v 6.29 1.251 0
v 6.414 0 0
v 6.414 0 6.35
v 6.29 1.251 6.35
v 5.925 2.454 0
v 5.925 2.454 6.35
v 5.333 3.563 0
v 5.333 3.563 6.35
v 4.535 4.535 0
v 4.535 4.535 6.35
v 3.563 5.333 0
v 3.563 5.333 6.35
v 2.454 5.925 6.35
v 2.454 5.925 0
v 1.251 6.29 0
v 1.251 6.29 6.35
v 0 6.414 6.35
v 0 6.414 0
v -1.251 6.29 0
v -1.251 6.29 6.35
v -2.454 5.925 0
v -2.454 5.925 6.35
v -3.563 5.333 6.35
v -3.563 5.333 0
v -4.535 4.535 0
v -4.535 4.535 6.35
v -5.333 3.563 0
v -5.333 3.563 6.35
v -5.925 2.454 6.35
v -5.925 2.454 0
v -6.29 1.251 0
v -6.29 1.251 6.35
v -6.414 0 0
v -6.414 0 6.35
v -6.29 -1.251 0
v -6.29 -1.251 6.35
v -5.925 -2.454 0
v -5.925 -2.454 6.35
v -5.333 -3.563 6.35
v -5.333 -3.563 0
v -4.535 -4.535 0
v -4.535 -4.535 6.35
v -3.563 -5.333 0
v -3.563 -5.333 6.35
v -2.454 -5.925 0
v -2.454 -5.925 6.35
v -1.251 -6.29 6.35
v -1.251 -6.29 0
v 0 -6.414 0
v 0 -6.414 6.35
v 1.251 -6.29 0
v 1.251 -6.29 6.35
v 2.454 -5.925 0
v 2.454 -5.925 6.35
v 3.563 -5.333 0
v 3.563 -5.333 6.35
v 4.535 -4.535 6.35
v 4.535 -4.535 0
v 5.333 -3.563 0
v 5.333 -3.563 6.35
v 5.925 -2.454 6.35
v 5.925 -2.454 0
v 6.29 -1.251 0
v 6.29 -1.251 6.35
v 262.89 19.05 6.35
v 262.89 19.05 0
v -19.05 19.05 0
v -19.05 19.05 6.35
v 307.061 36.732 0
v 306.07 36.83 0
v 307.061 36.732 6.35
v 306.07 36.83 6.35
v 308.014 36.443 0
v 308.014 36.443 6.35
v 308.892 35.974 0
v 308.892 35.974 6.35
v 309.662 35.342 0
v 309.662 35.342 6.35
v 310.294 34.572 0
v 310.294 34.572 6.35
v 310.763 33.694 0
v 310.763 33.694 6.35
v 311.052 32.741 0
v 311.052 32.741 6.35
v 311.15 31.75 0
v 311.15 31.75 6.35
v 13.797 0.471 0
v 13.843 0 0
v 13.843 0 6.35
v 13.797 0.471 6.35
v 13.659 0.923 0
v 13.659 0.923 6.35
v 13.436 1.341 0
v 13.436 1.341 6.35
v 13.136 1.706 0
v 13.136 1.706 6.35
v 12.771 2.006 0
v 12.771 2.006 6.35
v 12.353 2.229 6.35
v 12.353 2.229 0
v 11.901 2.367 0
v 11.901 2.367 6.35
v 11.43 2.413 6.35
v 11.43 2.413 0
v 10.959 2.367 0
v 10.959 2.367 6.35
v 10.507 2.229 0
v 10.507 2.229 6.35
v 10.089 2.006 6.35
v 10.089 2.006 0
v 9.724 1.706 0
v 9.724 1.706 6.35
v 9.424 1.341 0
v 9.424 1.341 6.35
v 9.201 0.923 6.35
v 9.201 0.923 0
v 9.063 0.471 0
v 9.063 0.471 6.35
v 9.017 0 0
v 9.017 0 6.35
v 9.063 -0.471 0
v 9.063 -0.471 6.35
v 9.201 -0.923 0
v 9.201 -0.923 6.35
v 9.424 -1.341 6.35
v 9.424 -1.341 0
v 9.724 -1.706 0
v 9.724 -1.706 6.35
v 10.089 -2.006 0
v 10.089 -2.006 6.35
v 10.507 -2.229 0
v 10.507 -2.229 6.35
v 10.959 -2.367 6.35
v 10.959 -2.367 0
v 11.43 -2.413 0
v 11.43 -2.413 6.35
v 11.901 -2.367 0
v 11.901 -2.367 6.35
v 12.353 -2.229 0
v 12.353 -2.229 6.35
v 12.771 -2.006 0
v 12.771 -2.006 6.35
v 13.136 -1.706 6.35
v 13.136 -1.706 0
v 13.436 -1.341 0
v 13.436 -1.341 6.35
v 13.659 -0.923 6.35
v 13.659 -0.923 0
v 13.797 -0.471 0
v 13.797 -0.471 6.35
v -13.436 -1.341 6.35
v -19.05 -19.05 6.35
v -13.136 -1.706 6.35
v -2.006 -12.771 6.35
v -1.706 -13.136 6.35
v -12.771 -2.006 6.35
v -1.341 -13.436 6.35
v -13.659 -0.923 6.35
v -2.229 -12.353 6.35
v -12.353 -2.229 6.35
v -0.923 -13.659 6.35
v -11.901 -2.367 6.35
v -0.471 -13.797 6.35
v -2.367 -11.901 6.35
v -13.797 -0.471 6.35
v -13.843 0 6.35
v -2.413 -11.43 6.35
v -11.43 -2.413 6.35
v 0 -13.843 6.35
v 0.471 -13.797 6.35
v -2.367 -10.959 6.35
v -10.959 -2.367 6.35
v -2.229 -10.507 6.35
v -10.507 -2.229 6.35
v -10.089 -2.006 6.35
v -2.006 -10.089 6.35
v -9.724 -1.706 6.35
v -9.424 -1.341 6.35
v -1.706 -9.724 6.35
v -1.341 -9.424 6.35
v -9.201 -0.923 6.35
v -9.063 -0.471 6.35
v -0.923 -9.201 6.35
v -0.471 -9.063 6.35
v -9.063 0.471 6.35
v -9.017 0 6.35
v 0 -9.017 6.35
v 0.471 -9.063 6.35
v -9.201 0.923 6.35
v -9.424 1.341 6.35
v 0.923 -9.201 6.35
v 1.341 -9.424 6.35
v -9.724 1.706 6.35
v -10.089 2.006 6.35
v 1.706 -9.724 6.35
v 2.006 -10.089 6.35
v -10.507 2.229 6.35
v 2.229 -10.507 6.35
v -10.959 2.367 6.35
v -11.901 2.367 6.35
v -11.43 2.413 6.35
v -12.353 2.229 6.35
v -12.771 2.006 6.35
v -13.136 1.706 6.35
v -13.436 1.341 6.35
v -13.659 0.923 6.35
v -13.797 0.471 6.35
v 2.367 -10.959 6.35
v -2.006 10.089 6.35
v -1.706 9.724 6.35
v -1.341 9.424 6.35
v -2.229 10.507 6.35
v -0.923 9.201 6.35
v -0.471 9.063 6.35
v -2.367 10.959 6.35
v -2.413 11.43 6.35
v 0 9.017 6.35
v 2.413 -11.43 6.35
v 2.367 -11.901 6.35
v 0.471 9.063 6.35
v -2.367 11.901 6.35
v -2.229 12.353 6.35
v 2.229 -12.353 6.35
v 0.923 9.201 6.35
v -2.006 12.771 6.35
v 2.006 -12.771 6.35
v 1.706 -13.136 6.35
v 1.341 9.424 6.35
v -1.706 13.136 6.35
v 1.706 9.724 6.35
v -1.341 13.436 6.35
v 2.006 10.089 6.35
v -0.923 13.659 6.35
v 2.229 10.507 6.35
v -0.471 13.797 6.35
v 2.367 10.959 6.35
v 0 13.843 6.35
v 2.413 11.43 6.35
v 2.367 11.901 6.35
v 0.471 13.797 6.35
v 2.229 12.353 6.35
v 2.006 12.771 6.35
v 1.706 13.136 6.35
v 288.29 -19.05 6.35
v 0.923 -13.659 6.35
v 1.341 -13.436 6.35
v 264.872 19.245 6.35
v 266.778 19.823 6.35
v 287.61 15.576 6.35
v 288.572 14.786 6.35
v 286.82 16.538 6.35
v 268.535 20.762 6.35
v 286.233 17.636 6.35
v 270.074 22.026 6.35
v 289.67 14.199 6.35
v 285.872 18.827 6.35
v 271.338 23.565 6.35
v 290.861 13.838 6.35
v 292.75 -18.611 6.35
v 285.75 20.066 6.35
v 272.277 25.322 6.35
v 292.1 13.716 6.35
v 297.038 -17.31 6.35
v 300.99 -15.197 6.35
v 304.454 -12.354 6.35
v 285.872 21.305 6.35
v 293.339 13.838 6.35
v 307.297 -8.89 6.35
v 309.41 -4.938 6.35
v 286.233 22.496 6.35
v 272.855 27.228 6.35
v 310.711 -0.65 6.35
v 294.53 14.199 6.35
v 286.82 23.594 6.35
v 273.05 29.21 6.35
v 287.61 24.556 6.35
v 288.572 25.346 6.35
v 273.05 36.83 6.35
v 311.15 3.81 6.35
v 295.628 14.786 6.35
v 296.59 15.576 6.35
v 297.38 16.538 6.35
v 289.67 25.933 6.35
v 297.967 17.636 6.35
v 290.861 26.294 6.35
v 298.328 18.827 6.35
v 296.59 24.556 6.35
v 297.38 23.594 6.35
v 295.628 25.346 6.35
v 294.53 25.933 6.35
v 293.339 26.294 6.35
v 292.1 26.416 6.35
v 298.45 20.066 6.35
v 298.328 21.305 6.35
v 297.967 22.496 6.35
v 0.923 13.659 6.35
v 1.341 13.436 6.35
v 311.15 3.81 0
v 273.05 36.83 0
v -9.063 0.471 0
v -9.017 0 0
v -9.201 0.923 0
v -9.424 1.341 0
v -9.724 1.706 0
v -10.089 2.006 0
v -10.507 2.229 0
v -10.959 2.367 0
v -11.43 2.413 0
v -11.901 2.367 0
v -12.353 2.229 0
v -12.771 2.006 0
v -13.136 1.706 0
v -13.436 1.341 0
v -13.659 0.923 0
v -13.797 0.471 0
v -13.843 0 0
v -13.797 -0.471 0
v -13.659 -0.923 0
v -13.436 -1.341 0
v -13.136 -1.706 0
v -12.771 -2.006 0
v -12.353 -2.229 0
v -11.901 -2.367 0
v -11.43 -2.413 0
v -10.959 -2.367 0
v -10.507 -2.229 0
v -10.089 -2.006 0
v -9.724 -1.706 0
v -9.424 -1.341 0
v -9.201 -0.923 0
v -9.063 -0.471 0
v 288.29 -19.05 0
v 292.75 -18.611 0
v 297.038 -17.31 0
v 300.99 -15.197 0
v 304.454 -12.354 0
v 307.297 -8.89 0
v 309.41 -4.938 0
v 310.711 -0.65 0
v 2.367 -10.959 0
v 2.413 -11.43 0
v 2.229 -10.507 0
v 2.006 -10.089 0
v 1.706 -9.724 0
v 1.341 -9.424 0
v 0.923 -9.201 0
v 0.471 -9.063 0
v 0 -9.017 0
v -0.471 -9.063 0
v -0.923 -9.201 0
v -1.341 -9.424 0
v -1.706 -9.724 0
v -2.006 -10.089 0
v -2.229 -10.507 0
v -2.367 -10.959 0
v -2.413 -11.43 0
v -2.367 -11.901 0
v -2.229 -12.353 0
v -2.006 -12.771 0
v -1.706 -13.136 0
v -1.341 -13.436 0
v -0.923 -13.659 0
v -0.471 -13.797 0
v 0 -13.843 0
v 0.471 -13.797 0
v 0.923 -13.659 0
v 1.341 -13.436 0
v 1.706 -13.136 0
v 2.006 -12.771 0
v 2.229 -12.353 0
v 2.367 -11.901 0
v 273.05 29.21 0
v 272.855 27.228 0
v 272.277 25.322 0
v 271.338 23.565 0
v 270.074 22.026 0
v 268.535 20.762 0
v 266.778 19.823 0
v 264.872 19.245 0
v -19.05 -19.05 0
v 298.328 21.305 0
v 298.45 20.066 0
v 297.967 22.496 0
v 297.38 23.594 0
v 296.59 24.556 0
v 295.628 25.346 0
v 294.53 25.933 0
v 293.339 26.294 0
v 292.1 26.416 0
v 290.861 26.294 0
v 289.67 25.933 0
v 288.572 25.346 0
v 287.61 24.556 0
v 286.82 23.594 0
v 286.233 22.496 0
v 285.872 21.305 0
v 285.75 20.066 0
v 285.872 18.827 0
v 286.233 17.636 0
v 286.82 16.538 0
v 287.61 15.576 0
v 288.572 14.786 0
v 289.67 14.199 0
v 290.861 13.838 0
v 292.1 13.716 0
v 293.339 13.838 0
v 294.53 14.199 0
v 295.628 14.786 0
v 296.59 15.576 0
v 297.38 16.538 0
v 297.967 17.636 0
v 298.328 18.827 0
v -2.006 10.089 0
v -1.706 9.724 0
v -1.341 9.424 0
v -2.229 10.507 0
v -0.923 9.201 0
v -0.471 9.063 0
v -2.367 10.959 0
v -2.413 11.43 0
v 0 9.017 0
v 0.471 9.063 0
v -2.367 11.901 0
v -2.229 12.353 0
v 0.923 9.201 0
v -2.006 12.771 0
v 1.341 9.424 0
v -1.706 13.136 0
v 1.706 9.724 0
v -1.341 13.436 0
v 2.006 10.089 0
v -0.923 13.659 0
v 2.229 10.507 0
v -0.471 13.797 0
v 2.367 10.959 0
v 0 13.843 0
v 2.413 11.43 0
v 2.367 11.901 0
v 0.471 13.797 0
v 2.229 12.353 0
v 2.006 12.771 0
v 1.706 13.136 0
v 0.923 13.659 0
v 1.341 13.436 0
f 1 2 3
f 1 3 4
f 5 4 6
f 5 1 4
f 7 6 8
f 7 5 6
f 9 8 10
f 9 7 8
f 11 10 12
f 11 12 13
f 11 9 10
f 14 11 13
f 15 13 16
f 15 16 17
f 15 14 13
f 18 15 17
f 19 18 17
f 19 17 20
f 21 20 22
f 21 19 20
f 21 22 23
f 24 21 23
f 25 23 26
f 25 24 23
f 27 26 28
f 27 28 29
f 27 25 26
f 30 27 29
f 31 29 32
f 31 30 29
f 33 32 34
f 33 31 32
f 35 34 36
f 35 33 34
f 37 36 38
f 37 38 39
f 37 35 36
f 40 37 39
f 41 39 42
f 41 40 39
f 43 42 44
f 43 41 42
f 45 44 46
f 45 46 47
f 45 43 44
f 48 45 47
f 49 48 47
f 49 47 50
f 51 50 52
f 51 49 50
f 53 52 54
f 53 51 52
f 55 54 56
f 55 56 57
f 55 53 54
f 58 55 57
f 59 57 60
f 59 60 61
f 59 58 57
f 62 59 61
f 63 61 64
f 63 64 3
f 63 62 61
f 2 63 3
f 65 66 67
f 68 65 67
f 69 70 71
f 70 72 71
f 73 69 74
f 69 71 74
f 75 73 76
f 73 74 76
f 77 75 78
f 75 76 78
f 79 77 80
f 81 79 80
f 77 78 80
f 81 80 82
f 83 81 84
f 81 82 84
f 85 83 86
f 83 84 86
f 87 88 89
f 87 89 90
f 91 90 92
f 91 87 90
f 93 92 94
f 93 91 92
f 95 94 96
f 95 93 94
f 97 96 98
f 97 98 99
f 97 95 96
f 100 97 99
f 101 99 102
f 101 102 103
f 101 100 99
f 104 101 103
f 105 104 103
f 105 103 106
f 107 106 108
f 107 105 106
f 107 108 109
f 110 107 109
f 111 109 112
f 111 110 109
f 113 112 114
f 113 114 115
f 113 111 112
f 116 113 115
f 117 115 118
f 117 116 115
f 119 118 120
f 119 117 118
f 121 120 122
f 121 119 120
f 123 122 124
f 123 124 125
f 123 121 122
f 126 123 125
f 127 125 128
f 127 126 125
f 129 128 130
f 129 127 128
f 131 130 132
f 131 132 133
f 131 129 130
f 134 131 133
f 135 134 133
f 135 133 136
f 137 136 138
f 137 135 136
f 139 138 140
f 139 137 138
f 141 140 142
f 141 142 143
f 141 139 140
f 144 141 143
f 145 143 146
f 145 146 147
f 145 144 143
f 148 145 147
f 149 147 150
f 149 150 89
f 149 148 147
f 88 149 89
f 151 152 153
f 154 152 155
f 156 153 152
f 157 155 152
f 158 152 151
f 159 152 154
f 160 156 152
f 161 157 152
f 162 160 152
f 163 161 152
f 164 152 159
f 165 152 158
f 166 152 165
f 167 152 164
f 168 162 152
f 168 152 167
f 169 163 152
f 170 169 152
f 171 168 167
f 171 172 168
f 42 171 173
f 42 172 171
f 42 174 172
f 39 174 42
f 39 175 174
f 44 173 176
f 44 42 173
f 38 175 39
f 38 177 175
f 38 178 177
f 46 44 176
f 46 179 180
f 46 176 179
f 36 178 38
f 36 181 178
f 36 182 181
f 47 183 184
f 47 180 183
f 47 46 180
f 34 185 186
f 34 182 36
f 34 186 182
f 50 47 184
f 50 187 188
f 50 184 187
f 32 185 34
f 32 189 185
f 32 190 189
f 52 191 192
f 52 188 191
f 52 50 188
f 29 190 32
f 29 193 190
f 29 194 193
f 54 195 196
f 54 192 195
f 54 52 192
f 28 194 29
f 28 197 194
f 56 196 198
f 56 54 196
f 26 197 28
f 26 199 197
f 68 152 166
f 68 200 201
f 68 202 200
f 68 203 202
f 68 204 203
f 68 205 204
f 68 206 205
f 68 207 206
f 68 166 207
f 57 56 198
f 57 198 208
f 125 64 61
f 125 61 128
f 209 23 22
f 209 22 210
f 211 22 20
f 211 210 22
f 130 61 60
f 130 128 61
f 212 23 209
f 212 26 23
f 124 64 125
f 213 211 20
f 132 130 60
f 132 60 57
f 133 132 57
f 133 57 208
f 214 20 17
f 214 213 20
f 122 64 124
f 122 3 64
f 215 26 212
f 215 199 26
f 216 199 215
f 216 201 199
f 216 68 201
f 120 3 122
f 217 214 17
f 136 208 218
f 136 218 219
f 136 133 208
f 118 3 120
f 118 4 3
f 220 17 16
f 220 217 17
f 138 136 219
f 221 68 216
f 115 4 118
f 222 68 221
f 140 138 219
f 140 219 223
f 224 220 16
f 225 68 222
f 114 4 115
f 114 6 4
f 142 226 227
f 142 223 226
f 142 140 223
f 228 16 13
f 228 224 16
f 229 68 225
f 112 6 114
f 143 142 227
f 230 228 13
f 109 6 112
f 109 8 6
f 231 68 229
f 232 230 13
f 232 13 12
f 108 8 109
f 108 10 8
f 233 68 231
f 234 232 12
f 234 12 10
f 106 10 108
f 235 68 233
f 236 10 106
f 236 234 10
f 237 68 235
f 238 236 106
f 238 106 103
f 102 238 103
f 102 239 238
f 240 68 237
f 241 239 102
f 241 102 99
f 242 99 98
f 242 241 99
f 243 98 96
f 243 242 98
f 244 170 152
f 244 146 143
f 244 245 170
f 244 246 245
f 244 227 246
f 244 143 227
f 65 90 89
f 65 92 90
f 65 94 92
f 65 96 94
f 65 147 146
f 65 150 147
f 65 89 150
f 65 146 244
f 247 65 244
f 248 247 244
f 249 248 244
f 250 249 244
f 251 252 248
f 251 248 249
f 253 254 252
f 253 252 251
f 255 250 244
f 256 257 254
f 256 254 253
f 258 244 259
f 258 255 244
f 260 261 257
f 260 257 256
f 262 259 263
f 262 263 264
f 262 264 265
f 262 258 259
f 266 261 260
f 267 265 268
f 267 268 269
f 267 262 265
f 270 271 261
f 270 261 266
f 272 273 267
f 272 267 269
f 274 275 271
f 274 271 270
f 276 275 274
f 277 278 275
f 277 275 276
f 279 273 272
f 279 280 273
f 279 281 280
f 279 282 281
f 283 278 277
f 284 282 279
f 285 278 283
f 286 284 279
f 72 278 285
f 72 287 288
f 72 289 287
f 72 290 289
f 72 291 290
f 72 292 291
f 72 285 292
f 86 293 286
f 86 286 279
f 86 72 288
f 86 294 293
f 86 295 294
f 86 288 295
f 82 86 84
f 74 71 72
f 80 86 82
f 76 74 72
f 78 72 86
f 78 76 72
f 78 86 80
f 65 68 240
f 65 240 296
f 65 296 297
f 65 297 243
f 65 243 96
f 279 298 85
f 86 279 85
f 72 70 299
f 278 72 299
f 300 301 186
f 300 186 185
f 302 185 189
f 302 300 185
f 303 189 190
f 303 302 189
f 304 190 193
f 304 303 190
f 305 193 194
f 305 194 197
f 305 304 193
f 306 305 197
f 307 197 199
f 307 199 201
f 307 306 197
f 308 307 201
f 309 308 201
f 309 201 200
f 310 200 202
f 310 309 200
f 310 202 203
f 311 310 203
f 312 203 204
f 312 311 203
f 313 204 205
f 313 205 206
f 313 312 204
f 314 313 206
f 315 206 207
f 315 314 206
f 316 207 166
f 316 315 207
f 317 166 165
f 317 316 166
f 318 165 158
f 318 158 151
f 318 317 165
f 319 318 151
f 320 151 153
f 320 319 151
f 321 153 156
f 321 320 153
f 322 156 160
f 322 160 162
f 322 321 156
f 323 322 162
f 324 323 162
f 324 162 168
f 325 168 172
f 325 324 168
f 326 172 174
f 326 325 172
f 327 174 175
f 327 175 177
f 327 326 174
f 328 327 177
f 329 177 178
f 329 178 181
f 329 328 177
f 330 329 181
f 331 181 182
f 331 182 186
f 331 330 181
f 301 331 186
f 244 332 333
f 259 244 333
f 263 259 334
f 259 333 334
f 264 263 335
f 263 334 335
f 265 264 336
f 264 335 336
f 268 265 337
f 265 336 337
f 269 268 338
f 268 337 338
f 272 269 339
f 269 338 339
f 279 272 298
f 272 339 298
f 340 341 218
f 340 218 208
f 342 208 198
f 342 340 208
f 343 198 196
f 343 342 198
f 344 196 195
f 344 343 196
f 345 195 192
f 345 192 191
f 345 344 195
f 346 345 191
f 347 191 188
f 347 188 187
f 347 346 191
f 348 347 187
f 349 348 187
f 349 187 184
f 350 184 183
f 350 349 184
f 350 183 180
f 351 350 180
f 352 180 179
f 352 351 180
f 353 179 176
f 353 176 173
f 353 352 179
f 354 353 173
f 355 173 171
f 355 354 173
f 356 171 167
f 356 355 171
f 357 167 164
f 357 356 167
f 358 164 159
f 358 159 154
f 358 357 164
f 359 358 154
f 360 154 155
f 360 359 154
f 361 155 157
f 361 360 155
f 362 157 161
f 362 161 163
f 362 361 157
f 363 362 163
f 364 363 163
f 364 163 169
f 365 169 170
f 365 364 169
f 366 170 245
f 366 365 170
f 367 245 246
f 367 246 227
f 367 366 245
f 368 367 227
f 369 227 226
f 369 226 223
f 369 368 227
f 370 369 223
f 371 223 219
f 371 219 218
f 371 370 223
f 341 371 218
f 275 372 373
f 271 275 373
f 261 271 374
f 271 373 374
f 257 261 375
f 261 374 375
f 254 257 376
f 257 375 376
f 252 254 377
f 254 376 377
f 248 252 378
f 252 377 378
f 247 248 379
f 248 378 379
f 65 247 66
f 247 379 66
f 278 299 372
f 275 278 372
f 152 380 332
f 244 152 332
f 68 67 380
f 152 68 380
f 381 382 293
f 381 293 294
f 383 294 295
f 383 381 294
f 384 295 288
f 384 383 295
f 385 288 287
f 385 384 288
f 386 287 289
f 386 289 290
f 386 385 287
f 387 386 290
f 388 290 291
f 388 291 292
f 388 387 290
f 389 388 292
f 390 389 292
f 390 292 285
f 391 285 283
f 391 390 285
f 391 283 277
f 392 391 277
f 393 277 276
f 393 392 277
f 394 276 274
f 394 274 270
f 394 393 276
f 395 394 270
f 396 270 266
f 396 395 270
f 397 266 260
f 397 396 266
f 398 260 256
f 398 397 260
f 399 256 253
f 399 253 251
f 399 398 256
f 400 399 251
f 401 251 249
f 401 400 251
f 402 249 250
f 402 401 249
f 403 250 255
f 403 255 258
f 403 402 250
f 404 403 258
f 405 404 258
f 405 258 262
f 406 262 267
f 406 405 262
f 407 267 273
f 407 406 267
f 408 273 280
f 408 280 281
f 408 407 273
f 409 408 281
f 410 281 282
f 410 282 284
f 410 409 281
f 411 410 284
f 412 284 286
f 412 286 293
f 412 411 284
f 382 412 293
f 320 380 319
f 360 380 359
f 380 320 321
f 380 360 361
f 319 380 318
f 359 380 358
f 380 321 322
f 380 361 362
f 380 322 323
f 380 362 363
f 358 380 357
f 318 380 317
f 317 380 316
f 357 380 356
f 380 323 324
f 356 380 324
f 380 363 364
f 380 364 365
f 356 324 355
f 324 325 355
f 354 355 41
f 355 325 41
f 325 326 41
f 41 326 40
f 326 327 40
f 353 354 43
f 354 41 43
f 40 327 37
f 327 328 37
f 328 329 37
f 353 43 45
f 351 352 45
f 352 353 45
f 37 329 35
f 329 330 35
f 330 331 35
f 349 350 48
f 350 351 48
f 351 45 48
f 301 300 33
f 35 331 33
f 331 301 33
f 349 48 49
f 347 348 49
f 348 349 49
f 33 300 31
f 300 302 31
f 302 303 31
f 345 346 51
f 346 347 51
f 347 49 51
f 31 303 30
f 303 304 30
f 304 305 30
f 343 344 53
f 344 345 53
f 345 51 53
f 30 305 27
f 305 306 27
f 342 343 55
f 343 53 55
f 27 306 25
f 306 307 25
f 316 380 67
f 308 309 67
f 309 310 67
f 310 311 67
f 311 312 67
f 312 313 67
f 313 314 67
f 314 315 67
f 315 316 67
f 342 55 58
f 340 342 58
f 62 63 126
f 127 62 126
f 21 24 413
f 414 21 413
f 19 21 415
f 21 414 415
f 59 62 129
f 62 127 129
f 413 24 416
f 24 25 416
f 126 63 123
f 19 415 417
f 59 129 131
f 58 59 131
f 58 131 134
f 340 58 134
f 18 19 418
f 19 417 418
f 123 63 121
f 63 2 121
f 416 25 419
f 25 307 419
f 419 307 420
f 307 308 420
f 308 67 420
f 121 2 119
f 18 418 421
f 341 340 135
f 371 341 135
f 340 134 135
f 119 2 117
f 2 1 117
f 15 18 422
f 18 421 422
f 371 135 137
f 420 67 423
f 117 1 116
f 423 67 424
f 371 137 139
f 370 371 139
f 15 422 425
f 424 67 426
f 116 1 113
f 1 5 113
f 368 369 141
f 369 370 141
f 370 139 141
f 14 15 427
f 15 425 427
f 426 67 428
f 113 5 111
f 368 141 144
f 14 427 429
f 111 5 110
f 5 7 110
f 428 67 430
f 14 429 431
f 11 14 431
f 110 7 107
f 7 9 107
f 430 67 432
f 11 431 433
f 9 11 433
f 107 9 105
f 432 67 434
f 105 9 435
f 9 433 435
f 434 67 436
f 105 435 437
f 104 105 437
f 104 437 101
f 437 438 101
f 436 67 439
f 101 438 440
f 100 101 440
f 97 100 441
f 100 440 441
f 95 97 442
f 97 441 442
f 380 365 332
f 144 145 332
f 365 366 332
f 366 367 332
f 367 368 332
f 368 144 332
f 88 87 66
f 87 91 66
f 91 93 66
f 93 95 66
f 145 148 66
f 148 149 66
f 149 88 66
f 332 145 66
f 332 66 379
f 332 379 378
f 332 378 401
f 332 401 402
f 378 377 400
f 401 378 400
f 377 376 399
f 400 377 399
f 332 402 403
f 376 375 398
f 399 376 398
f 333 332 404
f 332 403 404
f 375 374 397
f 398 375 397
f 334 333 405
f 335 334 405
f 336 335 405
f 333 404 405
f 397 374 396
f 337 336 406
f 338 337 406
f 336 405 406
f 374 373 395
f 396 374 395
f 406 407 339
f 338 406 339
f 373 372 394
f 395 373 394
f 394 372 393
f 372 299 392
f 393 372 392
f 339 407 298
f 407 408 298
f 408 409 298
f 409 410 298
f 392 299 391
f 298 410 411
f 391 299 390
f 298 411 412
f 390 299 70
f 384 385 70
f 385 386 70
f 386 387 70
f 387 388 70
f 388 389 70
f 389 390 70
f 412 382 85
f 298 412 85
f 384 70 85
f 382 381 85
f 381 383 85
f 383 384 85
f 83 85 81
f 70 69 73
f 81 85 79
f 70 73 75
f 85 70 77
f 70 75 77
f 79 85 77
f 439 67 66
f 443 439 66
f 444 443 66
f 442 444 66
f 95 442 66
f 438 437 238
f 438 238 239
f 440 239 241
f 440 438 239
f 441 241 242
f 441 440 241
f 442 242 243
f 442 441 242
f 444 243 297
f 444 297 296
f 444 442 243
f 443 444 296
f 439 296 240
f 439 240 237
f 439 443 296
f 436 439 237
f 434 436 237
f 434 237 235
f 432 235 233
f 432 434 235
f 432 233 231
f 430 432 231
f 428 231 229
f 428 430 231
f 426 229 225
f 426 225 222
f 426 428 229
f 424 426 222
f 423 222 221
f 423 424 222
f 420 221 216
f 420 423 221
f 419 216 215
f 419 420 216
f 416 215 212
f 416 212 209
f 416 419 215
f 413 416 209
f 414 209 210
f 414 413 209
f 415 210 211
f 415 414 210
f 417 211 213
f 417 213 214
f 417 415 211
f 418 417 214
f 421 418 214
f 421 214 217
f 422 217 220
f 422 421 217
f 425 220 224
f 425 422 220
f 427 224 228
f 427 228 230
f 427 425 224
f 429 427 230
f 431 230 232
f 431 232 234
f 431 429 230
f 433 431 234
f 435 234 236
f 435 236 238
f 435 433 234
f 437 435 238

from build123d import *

# Parameters (mm, degrees)
SKETCH1_R           = 6.4135
SKETCH1_R_2         = 2.413
SKETCH1_R_3         = 6.35
BOSS_EXTRUDE1_DEPTH = 6.35
FILLET1_R           = 5.08


with BuildPart() as part:
    # Sketch1 → Boss-Extrude1 (new body)
    with BuildSketch(Plane.XY):
        with BuildLine():
            Line((273.05, 36.83), (273.05, 29.21))
            ThreePointArc((273.05, 29.21), (270.074204897, 22.025795103), (262.89, 19.05))
            Line((262.89, 19.05), (-19.05, 19.05))
            Line((-19.05, 19.05), (-19.05, -19.05))
            Line((-19.05, -19.05), (285.190051277, -19.05))
            Line((285.190051277, -19.05), (288.29, -19.05))
            ThreePointArc((288.29, -19.05), (304.454461018, -12.354461018), (311.15, 3.81))
            Line((311.15, 3.81), (311.15, 36.83))
            Line((311.15, 36.83), (273.05, 36.83))
        make_face()
        Circle(SKETCH1_R, mode=Mode.SUBTRACT)
        with Locations((0, 11.43)):
            Circle(SKETCH1_R_2, mode=Mode.SUBTRACT)
        with Locations((11.43, 0)):
            Circle(SKETCH1_R_2, mode=Mode.SUBTRACT)
        with Locations((0, -11.43)):
            Circle(SKETCH1_R_2, mode=Mode.SUBTRACT)
        with Locations((-11.43, 0)):
            Circle(SKETCH1_R_2, mode=Mode.SUBTRACT)
        with Locations((292.1, 20.066)):
            Circle(SKETCH1_R_3, mode=Mode.SUBTRACT)
    extrude(amount=BOSS_EXTRUDE1_DEPTH)

    # Fillet1
    fillet1_edges = [part.edges().sort_by_distance(p)[0] for p in [
        (311.15, 36.83, 3.175),
    ]]
    fillet(fillet1_edges, radius=FILLET1_R)


solid = part.part
